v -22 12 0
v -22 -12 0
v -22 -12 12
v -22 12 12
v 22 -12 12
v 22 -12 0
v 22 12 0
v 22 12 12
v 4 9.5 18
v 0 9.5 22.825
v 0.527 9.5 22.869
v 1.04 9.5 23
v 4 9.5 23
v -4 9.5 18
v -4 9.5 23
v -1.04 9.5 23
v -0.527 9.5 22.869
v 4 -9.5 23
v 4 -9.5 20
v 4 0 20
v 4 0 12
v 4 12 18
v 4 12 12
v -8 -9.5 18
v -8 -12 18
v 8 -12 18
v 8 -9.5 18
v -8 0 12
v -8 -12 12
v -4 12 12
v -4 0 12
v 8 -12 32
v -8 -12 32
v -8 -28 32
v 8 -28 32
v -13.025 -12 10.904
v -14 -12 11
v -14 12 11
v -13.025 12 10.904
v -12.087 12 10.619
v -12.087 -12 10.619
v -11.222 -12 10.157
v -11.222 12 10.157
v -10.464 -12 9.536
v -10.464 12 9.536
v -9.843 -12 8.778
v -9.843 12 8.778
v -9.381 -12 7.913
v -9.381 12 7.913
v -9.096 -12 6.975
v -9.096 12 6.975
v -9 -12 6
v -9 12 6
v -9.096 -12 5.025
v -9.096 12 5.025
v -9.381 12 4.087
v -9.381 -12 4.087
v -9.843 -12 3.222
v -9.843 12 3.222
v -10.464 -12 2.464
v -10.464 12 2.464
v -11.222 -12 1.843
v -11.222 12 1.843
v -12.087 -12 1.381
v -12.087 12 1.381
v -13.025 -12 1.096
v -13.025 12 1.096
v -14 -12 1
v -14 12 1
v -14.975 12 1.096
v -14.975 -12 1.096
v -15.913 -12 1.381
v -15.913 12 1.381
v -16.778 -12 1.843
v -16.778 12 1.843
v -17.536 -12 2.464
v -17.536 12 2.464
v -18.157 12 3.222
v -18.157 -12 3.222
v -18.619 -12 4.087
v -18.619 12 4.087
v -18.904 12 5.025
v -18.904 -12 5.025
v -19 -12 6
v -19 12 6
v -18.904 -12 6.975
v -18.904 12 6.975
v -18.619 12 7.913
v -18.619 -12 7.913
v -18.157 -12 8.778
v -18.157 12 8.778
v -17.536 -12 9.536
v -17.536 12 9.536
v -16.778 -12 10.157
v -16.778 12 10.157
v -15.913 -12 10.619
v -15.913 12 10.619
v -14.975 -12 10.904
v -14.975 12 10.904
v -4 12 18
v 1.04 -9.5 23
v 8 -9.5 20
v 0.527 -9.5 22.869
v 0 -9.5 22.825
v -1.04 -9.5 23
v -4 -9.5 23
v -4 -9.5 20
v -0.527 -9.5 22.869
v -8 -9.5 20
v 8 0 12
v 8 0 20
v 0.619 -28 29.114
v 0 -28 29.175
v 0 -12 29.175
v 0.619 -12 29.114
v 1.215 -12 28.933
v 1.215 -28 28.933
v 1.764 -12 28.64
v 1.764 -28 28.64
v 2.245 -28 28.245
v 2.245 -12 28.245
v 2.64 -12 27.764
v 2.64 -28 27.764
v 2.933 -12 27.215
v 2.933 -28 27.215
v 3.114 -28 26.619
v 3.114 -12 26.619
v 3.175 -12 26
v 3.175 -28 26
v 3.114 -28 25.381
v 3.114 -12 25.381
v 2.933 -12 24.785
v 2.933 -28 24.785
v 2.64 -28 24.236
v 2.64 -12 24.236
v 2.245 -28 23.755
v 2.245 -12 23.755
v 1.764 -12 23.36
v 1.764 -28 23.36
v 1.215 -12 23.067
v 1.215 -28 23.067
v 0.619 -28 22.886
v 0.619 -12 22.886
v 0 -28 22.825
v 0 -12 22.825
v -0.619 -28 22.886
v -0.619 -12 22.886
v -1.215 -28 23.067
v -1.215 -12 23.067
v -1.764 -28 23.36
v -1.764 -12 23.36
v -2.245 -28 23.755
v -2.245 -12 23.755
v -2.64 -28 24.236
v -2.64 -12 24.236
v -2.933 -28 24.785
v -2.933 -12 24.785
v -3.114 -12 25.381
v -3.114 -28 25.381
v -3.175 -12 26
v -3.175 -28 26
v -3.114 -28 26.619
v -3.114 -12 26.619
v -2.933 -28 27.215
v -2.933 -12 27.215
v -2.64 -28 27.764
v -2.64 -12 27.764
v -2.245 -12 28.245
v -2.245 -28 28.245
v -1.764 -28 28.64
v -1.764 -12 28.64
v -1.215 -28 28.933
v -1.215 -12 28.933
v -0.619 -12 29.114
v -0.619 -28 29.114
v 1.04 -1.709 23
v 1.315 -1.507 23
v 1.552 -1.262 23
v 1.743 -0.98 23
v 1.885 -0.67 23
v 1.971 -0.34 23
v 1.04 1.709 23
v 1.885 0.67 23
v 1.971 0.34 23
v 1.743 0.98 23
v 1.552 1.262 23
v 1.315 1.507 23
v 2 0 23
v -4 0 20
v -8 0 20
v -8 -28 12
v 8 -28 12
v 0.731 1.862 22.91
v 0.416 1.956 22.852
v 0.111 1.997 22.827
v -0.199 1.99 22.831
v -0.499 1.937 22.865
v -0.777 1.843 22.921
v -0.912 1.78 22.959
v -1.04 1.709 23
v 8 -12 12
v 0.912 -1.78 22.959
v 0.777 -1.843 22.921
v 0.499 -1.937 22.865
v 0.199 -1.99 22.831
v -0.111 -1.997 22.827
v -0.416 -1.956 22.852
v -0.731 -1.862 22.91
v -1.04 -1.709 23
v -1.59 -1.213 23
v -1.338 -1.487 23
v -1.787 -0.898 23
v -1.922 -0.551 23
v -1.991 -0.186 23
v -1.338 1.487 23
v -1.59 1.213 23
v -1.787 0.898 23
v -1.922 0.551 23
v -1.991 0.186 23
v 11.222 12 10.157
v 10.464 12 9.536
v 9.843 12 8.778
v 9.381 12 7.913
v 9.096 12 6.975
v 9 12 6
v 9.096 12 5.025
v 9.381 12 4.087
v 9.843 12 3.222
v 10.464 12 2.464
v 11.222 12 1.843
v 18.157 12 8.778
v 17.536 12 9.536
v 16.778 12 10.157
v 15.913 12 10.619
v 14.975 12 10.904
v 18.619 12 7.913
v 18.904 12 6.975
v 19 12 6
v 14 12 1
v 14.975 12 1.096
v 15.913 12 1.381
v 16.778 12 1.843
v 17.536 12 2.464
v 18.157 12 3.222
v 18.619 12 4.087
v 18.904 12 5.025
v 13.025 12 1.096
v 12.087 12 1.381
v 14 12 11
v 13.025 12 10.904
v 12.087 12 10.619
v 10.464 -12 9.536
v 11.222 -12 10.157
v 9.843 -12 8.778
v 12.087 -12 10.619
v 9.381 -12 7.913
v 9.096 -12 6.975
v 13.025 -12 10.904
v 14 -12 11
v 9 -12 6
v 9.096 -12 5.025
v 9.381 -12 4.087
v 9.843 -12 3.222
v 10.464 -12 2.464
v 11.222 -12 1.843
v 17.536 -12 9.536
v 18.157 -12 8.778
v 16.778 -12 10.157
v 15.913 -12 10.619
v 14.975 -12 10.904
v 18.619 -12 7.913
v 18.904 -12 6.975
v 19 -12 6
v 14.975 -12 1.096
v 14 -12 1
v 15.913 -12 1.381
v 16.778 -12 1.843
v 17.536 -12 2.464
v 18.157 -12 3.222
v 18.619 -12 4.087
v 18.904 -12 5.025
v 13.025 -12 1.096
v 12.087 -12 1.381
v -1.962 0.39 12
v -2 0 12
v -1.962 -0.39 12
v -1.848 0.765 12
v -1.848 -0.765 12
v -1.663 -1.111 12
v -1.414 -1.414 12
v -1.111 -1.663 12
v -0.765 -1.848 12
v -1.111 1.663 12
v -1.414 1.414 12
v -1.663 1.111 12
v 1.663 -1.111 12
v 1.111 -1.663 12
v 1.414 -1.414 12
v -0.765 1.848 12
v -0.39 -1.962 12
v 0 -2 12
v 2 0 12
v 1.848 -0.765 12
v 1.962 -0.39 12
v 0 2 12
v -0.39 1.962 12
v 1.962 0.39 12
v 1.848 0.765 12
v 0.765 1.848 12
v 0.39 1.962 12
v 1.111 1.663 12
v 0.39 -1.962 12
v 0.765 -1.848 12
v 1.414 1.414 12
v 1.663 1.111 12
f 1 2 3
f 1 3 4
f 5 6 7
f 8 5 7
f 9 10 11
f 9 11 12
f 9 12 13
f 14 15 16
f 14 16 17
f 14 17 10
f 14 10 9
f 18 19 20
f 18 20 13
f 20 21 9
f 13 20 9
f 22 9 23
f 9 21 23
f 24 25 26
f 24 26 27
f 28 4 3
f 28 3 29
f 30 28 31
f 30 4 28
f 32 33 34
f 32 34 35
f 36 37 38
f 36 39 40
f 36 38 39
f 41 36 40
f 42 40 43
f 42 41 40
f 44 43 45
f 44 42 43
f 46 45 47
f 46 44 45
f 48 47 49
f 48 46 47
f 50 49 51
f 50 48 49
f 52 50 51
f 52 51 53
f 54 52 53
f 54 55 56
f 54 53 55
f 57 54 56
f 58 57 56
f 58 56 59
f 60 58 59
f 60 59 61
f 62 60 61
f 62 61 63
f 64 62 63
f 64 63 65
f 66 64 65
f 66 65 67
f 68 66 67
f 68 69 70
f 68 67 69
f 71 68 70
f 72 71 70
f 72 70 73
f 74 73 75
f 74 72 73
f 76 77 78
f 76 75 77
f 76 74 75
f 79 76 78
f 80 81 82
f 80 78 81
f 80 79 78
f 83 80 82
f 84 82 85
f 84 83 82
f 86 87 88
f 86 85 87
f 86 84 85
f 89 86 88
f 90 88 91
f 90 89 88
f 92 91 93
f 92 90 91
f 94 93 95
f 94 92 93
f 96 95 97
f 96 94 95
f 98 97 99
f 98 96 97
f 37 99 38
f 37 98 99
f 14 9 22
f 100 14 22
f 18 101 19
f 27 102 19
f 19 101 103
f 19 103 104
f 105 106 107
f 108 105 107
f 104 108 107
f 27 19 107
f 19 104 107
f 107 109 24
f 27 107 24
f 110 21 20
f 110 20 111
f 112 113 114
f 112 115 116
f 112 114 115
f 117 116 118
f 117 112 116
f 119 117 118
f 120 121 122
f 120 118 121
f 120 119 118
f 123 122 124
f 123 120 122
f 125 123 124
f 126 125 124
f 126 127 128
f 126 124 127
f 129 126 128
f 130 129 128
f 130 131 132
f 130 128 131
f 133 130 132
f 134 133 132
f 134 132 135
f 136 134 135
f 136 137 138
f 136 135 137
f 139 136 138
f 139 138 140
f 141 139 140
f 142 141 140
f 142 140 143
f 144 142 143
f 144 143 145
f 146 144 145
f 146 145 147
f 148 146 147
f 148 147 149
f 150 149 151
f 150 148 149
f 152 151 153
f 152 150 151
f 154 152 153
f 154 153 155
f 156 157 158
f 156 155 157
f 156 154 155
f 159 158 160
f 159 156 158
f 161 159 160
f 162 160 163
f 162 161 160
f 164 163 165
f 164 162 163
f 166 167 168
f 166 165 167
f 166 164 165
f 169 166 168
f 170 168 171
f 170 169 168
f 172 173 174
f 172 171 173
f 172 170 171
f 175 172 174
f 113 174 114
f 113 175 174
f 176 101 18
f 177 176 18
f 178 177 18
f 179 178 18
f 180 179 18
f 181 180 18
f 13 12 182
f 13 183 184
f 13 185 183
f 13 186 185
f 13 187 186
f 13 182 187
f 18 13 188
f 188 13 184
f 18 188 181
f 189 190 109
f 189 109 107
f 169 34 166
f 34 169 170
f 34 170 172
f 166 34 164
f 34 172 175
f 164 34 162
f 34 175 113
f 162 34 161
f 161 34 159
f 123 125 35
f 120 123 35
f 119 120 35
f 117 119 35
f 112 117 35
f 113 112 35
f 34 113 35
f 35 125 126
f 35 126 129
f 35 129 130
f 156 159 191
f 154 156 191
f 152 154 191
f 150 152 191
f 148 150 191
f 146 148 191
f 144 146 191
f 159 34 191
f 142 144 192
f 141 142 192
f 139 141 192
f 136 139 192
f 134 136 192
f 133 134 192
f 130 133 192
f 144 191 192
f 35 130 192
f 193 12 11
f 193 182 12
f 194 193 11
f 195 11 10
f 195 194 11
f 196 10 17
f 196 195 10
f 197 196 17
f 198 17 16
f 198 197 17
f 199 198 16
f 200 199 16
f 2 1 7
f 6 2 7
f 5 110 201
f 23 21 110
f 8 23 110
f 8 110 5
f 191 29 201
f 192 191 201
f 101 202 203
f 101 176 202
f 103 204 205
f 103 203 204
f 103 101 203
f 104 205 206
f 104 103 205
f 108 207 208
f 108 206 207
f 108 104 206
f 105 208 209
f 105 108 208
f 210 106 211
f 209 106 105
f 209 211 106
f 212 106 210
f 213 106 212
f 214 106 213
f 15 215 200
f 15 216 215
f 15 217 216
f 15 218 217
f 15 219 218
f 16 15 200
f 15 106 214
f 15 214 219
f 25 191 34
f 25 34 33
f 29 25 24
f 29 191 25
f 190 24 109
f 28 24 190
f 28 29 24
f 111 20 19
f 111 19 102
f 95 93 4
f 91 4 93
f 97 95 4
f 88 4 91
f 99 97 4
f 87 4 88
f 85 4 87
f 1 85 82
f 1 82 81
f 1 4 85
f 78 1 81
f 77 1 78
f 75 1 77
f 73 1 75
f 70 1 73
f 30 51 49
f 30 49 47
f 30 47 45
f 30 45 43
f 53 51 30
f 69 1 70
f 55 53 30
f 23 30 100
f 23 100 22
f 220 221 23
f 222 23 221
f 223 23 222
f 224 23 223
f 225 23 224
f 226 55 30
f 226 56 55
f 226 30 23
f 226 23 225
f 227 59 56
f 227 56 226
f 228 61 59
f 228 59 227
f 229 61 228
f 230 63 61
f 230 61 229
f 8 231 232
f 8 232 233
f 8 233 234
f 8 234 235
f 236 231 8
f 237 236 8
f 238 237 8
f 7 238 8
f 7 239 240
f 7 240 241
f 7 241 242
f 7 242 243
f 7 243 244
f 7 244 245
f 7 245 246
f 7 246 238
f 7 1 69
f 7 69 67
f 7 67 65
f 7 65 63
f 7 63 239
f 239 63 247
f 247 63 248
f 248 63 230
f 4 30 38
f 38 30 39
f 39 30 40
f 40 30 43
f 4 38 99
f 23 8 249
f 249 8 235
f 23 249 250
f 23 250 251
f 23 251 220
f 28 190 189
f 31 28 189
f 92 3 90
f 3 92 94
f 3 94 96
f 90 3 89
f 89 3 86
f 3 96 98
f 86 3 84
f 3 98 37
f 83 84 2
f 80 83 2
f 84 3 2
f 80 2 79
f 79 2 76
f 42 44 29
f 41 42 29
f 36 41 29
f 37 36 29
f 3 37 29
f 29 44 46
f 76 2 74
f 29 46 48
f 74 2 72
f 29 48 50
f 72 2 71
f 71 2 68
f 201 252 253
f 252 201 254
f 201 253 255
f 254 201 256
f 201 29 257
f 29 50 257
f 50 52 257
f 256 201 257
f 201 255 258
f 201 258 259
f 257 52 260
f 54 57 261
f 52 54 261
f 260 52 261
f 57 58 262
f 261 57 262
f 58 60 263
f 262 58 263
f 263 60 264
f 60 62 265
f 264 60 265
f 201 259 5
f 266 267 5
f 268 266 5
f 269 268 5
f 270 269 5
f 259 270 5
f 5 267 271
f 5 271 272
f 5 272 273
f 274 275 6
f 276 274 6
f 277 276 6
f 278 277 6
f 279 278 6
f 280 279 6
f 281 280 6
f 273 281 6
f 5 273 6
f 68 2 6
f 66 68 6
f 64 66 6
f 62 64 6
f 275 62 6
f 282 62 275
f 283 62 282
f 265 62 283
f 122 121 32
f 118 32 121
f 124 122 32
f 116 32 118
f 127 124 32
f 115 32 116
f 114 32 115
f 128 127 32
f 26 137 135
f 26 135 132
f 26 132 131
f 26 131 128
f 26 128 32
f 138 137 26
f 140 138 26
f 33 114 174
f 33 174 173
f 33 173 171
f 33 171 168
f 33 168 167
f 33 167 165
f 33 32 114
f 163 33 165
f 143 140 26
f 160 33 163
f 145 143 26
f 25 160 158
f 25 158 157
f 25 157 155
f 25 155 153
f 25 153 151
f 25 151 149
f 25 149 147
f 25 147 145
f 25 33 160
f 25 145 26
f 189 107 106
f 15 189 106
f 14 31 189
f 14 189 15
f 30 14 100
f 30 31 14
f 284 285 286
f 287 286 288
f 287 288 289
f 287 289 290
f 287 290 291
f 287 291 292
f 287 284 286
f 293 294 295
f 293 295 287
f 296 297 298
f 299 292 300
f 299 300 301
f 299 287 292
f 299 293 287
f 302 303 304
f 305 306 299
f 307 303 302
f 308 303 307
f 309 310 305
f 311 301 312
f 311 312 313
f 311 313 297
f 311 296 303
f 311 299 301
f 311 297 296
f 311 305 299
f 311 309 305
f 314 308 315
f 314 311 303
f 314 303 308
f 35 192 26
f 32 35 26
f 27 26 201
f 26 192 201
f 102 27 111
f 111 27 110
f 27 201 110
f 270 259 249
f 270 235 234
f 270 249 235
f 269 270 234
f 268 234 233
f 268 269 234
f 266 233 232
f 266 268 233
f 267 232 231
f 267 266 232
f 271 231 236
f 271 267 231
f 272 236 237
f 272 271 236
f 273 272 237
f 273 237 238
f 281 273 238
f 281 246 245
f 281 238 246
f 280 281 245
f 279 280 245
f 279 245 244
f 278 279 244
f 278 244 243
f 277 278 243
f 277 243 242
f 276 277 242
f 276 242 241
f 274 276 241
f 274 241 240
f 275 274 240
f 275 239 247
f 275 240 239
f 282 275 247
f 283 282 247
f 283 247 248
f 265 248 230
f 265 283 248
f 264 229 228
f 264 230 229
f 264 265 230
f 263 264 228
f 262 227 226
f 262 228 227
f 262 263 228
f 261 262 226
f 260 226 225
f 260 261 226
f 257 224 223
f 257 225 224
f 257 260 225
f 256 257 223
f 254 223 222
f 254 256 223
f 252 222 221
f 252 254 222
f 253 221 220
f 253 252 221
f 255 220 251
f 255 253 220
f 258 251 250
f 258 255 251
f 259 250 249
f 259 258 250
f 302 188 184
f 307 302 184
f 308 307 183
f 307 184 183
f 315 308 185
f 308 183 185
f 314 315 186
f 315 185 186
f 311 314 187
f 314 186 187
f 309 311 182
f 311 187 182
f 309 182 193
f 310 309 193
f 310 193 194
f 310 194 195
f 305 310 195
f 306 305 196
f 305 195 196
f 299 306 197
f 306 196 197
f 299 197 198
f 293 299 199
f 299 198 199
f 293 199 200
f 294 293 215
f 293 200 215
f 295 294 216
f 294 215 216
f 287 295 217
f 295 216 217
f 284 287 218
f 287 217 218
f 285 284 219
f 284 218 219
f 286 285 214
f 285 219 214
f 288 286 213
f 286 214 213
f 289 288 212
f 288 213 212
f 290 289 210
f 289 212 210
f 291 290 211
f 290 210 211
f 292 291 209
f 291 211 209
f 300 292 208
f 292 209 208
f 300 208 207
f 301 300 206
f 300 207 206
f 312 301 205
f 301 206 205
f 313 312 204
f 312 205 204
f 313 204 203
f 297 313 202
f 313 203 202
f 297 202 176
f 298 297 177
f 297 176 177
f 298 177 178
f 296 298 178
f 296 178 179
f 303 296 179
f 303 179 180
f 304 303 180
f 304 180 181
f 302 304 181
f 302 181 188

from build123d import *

# Parameters (mm, degrees)
SKETCH1_W                                   = 44
SKETCH1_H                                   = 24
CROSSHEAD_BASE_DEPTH                        = 12
SHOE_UPRISER_START                          = 12
SKETCH2_W                                   = 8
SKETCH2_H                                   = 24
SHOE_UPRISER_DEPTH                          = 11
ADAPTER_BRIDGE_START                        = 12
SKETCH3_W                                   = 16
SKETCH3_H                                   = 28
ADAPTER_BRIDGE_DEPTH                        = 8
THREADED_ROD_ADAPTER_START                  = 20
SKETCH4_W                                   = 16
SKETCH4_H                                   = 16
THREADED_ROD_ADAPTER_DEPTH                  = 12
TWO_BRONZE_BUSH_HOUSINGS_DEPTH              = 48.874836814
TWO_BRONZE_BUSH_HOUSINGS_DEPTH_BACK         = 48.874836814
SKETCH5_R                                   = 5
QUARTER20_ADAPTER_MAJOR_ENVELOPE_DEPTH      = 48.874836814
QUARTER20_ADAPTER_MAJOR_ENVELOPE_DEPTH_BACK = 48.874836814
SKETCH6_R                                   = 3.175
SKETCH7_R                                   = 2
M4_SHOE_THREAD_MAJOR_ENVELOPE_DEPTH         = 11
CROSS_SLOT_BOTTOM_CLEARANCE_DEPTH           = 48.874836873
CROSS_SLOT_BOTTOM_CLEARANCE_DEPTH_BACK      = 48.874836873
SKETCH8_W                                   = 5.5
SKETCH8_H                                   = 2.5
SKETCH8_H_2                                 = 3


with BuildPart() as part:
    # Sketch1 → Crosshead_Base (new body)
    with BuildSketch(Plane.XY):
        Rectangle(SKETCH1_W, SKETCH1_H)
    extrude(amount=CROSSHEAD_BASE_DEPTH)

    # Sketch2 → Shoe_Upriser (add)
    with BuildSketch(Plane.XY.offset(SHOE_UPRISER_START)):
        Rectangle(SKETCH2_W, SKETCH2_H)
    extrude(amount=SHOE_UPRISER_DEPTH)

    # Sketch3 → Adapter_Bridge (add)
    with BuildSketch(Plane.XY.offset(ADAPTER_BRIDGE_START)):
        with Locations((0, -14)):
            Rectangle(SKETCH3_W, SKETCH3_H)
    extrude(amount=ADAPTER_BRIDGE_DEPTH)

    # Sketch4 → Threaded_Rod_Adapter (add)
    with BuildSketch(Plane.XY.offset(THREADED_ROD_ADAPTER_START)):
        with Locations((0, -20)):
            Rectangle(SKETCH4_W, SKETCH4_H)
    extrude(amount=THREADED_ROD_ADAPTER_DEPTH)

    # Sketch5 → Two_Bronze_Bush_Housings (cut, two sides: drawn at the far end of the back side and taken through both)
    with BuildSketch(Plane(origin=(0, 0, 0), x_dir=(1, 0, 0), z_dir=(0, 1, 0)).offset(-TWO_BRONZE_BUSH_HOUSINGS_DEPTH_BACK)):
        with Locations(Location((-14, -6, 0), (0, 0, 270))):
            Circle(SKETCH5_R)
        with Locations(Location((14, -6, 0), (0, 0, 270))):
            Circle(SKETCH5_R)
    extrude(amount=TWO_BRONZE_BUSH_HOUSINGS_DEPTH + TWO_BRONZE_BUSH_HOUSINGS_DEPTH_BACK, mode=Mode.SUBTRACT)

    # Sketch6 → Quarter20_Adapter_Major_Envelope (cut, two sides: drawn at the far end of the back side and taken through both)
    with BuildSketch(Plane(origin=(0, 0, 0), x_dir=(1, 0, 0), z_dir=(0, 1, 0)).offset(-QUARTER20_ADAPTER_MAJOR_ENVELOPE_DEPTH_BACK)):
        with Locations(Location((0, -26, 0), (0, 0, 270))):
            Circle(SKETCH6_R)
    extrude(amount=QUARTER20_ADAPTER_MAJOR_ENVELOPE_DEPTH + QUARTER20_ADAPTER_MAJOR_ENVELOPE_DEPTH_BACK, mode=Mode.SUBTRACT)

    # Sketch7 → M4_Shoe_Thread_Major_Envelope (cut)
    with BuildSketch(Plane.XY.offset(23)):
        Circle(SKETCH7_R)
    extrude(amount=-M4_SHOE_THREAD_MAJOR_ENVELOPE_DEPTH, mode=Mode.SUBTRACT)

    # Sketch8 → Cross_Slot_Bottom_Clearance (cut, two sides: drawn at the far end of the back side and taken through both)
    with BuildSketch(Plane(origin=(0, 0, 0), x_dir=(0, 0, -1), z_dir=(1, 0, 0)).offset(-CROSS_SLOT_BOTTOM_CLEARANCE_DEPTH_BACK)):
        with Locations((-20.75, -10.75)):
            Rectangle(SKETCH8_W, SKETCH8_H)
        with Locations((-20.75, 11)):
            Rectangle(SKETCH8_W, SKETCH8_H_2)
    extrude(amount=CROSS_SLOT_BOTTOM_CLEARANCE_DEPTH + CROSS_SLOT_BOTTOM_CLEARANCE_DEPTH_BACK, mode=Mode.SUBTRACT)


solid = part.part
